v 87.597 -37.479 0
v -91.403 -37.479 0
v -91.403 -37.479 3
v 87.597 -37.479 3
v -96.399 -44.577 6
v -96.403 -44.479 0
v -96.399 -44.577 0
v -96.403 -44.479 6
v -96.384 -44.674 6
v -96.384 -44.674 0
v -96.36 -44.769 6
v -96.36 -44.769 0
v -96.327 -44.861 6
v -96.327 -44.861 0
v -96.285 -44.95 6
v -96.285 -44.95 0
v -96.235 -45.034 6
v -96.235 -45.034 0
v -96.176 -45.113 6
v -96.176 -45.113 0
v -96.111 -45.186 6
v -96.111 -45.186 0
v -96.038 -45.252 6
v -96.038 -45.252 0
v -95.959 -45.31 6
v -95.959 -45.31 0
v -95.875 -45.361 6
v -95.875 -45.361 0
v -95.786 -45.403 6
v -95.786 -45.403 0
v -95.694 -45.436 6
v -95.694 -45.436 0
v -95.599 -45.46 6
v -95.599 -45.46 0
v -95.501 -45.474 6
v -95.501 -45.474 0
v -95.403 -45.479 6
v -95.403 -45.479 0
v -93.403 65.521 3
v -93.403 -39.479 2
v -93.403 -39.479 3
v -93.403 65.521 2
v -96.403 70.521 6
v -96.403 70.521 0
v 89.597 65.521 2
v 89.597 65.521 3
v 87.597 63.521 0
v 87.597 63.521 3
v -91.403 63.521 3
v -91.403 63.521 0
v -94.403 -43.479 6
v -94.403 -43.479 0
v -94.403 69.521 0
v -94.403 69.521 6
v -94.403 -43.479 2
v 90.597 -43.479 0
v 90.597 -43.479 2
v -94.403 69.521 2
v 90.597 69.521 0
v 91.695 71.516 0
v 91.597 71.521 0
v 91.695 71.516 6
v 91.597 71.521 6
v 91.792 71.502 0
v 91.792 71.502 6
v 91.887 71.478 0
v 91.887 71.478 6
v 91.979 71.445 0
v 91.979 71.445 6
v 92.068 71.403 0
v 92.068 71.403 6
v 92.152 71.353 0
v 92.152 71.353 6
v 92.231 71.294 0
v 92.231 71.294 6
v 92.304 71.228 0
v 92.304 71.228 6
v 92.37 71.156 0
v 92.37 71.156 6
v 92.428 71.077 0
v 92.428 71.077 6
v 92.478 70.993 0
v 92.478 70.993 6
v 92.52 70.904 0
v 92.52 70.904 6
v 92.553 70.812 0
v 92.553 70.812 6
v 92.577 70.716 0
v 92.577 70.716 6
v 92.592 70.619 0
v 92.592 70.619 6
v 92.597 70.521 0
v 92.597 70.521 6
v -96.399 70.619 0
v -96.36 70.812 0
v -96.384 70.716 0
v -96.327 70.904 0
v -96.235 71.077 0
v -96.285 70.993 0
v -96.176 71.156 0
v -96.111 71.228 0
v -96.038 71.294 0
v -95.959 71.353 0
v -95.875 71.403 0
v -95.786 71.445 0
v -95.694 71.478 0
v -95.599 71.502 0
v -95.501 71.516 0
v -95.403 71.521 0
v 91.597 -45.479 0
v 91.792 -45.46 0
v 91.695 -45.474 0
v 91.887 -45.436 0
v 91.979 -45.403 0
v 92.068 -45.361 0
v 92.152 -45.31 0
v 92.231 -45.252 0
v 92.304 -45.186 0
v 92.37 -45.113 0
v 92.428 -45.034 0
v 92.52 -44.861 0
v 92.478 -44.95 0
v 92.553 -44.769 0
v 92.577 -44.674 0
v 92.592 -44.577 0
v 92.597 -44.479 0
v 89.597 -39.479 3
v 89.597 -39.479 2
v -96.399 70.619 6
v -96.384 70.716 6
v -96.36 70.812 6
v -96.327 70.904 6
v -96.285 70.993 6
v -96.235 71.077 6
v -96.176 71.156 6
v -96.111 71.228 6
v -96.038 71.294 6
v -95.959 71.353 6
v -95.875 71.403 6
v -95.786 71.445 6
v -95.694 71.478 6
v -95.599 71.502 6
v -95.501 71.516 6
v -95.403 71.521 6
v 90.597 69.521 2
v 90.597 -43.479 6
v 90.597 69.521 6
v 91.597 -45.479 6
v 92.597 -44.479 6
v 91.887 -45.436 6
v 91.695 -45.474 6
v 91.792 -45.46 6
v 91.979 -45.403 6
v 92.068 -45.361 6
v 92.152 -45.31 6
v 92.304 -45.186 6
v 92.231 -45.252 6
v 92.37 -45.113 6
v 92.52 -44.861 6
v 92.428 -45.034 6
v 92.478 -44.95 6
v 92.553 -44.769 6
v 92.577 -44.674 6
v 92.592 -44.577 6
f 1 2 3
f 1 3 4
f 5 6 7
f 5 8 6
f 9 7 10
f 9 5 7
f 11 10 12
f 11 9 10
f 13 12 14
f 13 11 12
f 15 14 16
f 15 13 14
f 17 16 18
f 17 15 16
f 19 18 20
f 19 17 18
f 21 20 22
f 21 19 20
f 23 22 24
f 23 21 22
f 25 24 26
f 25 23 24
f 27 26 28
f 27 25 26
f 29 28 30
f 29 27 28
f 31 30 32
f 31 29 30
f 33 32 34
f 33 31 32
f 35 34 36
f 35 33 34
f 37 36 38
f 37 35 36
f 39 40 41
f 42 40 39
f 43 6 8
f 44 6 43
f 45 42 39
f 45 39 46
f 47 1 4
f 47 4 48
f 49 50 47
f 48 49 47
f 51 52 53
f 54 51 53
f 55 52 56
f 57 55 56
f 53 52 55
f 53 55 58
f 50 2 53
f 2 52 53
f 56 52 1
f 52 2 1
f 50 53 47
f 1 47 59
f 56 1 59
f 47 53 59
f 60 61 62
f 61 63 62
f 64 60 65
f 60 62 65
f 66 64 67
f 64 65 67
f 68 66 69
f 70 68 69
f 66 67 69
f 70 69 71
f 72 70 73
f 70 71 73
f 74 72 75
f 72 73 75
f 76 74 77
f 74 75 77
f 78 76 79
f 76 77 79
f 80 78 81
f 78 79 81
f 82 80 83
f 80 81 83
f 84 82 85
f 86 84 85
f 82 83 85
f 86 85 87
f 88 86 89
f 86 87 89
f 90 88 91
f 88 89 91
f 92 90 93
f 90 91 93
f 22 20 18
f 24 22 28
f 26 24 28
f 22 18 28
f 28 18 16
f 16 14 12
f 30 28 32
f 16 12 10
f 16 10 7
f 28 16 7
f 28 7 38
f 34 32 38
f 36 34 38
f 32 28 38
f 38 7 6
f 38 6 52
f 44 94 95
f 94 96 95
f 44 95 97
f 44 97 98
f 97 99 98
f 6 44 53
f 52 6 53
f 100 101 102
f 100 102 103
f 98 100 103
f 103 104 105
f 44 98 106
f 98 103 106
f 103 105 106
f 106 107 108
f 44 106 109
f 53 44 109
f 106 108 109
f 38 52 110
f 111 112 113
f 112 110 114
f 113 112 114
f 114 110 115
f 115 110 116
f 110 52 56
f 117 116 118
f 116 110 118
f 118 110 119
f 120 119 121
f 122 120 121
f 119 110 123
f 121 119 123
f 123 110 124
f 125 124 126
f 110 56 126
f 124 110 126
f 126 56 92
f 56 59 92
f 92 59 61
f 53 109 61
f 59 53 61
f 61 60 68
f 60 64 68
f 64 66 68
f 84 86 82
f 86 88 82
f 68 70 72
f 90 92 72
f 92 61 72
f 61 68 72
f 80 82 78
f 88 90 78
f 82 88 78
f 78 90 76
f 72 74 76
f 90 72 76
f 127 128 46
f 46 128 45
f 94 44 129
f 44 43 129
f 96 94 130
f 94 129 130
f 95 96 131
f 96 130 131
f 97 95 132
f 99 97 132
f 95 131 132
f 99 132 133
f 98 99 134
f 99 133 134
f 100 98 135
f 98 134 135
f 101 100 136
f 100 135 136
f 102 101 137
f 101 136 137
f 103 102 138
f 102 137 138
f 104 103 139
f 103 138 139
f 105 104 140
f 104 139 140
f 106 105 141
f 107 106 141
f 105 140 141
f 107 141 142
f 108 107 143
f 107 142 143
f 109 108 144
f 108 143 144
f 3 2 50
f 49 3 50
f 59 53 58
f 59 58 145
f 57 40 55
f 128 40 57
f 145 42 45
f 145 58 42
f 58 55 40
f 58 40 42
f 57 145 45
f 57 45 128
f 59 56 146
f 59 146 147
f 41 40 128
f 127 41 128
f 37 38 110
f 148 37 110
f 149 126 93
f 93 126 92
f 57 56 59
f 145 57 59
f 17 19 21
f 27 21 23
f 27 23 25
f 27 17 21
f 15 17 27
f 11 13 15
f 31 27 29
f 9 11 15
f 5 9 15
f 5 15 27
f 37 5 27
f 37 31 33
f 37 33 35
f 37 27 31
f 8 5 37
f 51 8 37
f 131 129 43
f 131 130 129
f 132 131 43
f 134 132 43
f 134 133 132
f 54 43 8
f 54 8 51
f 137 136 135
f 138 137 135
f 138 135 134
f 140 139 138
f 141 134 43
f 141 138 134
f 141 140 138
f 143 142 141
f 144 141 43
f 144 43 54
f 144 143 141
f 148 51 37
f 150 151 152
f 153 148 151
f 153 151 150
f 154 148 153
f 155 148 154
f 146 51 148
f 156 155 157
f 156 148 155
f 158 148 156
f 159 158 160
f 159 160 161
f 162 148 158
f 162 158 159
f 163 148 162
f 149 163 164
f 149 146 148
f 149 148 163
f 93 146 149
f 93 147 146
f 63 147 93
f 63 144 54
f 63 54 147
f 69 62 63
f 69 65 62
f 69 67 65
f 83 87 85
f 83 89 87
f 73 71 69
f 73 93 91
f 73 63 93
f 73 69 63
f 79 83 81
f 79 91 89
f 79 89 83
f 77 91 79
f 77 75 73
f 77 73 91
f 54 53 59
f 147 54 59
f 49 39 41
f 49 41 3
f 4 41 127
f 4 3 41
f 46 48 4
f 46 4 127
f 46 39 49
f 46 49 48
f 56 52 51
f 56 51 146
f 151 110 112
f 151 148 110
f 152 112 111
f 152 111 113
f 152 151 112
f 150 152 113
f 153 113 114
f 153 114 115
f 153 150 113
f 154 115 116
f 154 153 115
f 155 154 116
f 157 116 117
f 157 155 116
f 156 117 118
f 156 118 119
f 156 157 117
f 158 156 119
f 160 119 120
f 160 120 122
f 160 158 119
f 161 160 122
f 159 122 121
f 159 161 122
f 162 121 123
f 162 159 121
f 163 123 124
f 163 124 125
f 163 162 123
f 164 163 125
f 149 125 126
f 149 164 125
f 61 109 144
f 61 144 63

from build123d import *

# Parameters (mm, degrees)
F0_W     = 189
F0_H     = 117
F0_W_2   = 185
F0_H_2   = 113
F1_DEPTH = 6
F0_W_3   = 183.000002
F0_H_3   = 105.000002
F2_DEPTH = 2
F3_R     = 1
F0_W_4   = 179
F0_H_4   = 101
F4_DEPTH = 3


with BuildPart() as f1:
    # F0 (on Top) → F1 (new body)
    with BuildSketch(Plane.XY):
        with Locations((-1.903477, 13.021269)):
            Rectangle(F0_W, F0_H)
        with Locations((-1.903477, 13.021269)):
            Rectangle(F0_W_2, F0_H_2, mode=Mode.SUBTRACT)
    extrude(amount=F1_DEPTH)

    # F3
    f3_edges = [f1.edges().sort_by_distance(p)[0] for p in [
        (-96.403477, -45.478731, 3),
        (-96.403477, 71.521269, 3),
        (92.596523, 71.521269, 3),
        (92.596523, -45.478731, 3),
    ]]
    fillet(f3_edges, radius=F3_R)


with BuildPart() as f2:
    # F0 (on Top) → F2 (new body)
    with BuildSketch(Plane.XY):
        with Locations((-1.903477, 13.021269)):
            Rectangle(F0_W_2, F0_H_2)
        with Locations((-1.903477, 13.021269)):
            Rectangle(F0_W_3, F0_H_3, mode=Mode.SUBTRACT)
    extrude(amount=F2_DEPTH)

    # F0 (on Top) → F4 (join)
    with BuildSketch(Plane.XY):
        with Locations((-1.903477, 13.021269)):
            Rectangle(F0_W_3, F0_H_3)
        with Locations((-1.903477, 13.021269)):
            Rectangle(F0_W_4, F0_H_4, mode=Mode.SUBTRACT)
    extrude(amount=F4_DEPTH)


solid = Compound([f1.part, f2.part])
